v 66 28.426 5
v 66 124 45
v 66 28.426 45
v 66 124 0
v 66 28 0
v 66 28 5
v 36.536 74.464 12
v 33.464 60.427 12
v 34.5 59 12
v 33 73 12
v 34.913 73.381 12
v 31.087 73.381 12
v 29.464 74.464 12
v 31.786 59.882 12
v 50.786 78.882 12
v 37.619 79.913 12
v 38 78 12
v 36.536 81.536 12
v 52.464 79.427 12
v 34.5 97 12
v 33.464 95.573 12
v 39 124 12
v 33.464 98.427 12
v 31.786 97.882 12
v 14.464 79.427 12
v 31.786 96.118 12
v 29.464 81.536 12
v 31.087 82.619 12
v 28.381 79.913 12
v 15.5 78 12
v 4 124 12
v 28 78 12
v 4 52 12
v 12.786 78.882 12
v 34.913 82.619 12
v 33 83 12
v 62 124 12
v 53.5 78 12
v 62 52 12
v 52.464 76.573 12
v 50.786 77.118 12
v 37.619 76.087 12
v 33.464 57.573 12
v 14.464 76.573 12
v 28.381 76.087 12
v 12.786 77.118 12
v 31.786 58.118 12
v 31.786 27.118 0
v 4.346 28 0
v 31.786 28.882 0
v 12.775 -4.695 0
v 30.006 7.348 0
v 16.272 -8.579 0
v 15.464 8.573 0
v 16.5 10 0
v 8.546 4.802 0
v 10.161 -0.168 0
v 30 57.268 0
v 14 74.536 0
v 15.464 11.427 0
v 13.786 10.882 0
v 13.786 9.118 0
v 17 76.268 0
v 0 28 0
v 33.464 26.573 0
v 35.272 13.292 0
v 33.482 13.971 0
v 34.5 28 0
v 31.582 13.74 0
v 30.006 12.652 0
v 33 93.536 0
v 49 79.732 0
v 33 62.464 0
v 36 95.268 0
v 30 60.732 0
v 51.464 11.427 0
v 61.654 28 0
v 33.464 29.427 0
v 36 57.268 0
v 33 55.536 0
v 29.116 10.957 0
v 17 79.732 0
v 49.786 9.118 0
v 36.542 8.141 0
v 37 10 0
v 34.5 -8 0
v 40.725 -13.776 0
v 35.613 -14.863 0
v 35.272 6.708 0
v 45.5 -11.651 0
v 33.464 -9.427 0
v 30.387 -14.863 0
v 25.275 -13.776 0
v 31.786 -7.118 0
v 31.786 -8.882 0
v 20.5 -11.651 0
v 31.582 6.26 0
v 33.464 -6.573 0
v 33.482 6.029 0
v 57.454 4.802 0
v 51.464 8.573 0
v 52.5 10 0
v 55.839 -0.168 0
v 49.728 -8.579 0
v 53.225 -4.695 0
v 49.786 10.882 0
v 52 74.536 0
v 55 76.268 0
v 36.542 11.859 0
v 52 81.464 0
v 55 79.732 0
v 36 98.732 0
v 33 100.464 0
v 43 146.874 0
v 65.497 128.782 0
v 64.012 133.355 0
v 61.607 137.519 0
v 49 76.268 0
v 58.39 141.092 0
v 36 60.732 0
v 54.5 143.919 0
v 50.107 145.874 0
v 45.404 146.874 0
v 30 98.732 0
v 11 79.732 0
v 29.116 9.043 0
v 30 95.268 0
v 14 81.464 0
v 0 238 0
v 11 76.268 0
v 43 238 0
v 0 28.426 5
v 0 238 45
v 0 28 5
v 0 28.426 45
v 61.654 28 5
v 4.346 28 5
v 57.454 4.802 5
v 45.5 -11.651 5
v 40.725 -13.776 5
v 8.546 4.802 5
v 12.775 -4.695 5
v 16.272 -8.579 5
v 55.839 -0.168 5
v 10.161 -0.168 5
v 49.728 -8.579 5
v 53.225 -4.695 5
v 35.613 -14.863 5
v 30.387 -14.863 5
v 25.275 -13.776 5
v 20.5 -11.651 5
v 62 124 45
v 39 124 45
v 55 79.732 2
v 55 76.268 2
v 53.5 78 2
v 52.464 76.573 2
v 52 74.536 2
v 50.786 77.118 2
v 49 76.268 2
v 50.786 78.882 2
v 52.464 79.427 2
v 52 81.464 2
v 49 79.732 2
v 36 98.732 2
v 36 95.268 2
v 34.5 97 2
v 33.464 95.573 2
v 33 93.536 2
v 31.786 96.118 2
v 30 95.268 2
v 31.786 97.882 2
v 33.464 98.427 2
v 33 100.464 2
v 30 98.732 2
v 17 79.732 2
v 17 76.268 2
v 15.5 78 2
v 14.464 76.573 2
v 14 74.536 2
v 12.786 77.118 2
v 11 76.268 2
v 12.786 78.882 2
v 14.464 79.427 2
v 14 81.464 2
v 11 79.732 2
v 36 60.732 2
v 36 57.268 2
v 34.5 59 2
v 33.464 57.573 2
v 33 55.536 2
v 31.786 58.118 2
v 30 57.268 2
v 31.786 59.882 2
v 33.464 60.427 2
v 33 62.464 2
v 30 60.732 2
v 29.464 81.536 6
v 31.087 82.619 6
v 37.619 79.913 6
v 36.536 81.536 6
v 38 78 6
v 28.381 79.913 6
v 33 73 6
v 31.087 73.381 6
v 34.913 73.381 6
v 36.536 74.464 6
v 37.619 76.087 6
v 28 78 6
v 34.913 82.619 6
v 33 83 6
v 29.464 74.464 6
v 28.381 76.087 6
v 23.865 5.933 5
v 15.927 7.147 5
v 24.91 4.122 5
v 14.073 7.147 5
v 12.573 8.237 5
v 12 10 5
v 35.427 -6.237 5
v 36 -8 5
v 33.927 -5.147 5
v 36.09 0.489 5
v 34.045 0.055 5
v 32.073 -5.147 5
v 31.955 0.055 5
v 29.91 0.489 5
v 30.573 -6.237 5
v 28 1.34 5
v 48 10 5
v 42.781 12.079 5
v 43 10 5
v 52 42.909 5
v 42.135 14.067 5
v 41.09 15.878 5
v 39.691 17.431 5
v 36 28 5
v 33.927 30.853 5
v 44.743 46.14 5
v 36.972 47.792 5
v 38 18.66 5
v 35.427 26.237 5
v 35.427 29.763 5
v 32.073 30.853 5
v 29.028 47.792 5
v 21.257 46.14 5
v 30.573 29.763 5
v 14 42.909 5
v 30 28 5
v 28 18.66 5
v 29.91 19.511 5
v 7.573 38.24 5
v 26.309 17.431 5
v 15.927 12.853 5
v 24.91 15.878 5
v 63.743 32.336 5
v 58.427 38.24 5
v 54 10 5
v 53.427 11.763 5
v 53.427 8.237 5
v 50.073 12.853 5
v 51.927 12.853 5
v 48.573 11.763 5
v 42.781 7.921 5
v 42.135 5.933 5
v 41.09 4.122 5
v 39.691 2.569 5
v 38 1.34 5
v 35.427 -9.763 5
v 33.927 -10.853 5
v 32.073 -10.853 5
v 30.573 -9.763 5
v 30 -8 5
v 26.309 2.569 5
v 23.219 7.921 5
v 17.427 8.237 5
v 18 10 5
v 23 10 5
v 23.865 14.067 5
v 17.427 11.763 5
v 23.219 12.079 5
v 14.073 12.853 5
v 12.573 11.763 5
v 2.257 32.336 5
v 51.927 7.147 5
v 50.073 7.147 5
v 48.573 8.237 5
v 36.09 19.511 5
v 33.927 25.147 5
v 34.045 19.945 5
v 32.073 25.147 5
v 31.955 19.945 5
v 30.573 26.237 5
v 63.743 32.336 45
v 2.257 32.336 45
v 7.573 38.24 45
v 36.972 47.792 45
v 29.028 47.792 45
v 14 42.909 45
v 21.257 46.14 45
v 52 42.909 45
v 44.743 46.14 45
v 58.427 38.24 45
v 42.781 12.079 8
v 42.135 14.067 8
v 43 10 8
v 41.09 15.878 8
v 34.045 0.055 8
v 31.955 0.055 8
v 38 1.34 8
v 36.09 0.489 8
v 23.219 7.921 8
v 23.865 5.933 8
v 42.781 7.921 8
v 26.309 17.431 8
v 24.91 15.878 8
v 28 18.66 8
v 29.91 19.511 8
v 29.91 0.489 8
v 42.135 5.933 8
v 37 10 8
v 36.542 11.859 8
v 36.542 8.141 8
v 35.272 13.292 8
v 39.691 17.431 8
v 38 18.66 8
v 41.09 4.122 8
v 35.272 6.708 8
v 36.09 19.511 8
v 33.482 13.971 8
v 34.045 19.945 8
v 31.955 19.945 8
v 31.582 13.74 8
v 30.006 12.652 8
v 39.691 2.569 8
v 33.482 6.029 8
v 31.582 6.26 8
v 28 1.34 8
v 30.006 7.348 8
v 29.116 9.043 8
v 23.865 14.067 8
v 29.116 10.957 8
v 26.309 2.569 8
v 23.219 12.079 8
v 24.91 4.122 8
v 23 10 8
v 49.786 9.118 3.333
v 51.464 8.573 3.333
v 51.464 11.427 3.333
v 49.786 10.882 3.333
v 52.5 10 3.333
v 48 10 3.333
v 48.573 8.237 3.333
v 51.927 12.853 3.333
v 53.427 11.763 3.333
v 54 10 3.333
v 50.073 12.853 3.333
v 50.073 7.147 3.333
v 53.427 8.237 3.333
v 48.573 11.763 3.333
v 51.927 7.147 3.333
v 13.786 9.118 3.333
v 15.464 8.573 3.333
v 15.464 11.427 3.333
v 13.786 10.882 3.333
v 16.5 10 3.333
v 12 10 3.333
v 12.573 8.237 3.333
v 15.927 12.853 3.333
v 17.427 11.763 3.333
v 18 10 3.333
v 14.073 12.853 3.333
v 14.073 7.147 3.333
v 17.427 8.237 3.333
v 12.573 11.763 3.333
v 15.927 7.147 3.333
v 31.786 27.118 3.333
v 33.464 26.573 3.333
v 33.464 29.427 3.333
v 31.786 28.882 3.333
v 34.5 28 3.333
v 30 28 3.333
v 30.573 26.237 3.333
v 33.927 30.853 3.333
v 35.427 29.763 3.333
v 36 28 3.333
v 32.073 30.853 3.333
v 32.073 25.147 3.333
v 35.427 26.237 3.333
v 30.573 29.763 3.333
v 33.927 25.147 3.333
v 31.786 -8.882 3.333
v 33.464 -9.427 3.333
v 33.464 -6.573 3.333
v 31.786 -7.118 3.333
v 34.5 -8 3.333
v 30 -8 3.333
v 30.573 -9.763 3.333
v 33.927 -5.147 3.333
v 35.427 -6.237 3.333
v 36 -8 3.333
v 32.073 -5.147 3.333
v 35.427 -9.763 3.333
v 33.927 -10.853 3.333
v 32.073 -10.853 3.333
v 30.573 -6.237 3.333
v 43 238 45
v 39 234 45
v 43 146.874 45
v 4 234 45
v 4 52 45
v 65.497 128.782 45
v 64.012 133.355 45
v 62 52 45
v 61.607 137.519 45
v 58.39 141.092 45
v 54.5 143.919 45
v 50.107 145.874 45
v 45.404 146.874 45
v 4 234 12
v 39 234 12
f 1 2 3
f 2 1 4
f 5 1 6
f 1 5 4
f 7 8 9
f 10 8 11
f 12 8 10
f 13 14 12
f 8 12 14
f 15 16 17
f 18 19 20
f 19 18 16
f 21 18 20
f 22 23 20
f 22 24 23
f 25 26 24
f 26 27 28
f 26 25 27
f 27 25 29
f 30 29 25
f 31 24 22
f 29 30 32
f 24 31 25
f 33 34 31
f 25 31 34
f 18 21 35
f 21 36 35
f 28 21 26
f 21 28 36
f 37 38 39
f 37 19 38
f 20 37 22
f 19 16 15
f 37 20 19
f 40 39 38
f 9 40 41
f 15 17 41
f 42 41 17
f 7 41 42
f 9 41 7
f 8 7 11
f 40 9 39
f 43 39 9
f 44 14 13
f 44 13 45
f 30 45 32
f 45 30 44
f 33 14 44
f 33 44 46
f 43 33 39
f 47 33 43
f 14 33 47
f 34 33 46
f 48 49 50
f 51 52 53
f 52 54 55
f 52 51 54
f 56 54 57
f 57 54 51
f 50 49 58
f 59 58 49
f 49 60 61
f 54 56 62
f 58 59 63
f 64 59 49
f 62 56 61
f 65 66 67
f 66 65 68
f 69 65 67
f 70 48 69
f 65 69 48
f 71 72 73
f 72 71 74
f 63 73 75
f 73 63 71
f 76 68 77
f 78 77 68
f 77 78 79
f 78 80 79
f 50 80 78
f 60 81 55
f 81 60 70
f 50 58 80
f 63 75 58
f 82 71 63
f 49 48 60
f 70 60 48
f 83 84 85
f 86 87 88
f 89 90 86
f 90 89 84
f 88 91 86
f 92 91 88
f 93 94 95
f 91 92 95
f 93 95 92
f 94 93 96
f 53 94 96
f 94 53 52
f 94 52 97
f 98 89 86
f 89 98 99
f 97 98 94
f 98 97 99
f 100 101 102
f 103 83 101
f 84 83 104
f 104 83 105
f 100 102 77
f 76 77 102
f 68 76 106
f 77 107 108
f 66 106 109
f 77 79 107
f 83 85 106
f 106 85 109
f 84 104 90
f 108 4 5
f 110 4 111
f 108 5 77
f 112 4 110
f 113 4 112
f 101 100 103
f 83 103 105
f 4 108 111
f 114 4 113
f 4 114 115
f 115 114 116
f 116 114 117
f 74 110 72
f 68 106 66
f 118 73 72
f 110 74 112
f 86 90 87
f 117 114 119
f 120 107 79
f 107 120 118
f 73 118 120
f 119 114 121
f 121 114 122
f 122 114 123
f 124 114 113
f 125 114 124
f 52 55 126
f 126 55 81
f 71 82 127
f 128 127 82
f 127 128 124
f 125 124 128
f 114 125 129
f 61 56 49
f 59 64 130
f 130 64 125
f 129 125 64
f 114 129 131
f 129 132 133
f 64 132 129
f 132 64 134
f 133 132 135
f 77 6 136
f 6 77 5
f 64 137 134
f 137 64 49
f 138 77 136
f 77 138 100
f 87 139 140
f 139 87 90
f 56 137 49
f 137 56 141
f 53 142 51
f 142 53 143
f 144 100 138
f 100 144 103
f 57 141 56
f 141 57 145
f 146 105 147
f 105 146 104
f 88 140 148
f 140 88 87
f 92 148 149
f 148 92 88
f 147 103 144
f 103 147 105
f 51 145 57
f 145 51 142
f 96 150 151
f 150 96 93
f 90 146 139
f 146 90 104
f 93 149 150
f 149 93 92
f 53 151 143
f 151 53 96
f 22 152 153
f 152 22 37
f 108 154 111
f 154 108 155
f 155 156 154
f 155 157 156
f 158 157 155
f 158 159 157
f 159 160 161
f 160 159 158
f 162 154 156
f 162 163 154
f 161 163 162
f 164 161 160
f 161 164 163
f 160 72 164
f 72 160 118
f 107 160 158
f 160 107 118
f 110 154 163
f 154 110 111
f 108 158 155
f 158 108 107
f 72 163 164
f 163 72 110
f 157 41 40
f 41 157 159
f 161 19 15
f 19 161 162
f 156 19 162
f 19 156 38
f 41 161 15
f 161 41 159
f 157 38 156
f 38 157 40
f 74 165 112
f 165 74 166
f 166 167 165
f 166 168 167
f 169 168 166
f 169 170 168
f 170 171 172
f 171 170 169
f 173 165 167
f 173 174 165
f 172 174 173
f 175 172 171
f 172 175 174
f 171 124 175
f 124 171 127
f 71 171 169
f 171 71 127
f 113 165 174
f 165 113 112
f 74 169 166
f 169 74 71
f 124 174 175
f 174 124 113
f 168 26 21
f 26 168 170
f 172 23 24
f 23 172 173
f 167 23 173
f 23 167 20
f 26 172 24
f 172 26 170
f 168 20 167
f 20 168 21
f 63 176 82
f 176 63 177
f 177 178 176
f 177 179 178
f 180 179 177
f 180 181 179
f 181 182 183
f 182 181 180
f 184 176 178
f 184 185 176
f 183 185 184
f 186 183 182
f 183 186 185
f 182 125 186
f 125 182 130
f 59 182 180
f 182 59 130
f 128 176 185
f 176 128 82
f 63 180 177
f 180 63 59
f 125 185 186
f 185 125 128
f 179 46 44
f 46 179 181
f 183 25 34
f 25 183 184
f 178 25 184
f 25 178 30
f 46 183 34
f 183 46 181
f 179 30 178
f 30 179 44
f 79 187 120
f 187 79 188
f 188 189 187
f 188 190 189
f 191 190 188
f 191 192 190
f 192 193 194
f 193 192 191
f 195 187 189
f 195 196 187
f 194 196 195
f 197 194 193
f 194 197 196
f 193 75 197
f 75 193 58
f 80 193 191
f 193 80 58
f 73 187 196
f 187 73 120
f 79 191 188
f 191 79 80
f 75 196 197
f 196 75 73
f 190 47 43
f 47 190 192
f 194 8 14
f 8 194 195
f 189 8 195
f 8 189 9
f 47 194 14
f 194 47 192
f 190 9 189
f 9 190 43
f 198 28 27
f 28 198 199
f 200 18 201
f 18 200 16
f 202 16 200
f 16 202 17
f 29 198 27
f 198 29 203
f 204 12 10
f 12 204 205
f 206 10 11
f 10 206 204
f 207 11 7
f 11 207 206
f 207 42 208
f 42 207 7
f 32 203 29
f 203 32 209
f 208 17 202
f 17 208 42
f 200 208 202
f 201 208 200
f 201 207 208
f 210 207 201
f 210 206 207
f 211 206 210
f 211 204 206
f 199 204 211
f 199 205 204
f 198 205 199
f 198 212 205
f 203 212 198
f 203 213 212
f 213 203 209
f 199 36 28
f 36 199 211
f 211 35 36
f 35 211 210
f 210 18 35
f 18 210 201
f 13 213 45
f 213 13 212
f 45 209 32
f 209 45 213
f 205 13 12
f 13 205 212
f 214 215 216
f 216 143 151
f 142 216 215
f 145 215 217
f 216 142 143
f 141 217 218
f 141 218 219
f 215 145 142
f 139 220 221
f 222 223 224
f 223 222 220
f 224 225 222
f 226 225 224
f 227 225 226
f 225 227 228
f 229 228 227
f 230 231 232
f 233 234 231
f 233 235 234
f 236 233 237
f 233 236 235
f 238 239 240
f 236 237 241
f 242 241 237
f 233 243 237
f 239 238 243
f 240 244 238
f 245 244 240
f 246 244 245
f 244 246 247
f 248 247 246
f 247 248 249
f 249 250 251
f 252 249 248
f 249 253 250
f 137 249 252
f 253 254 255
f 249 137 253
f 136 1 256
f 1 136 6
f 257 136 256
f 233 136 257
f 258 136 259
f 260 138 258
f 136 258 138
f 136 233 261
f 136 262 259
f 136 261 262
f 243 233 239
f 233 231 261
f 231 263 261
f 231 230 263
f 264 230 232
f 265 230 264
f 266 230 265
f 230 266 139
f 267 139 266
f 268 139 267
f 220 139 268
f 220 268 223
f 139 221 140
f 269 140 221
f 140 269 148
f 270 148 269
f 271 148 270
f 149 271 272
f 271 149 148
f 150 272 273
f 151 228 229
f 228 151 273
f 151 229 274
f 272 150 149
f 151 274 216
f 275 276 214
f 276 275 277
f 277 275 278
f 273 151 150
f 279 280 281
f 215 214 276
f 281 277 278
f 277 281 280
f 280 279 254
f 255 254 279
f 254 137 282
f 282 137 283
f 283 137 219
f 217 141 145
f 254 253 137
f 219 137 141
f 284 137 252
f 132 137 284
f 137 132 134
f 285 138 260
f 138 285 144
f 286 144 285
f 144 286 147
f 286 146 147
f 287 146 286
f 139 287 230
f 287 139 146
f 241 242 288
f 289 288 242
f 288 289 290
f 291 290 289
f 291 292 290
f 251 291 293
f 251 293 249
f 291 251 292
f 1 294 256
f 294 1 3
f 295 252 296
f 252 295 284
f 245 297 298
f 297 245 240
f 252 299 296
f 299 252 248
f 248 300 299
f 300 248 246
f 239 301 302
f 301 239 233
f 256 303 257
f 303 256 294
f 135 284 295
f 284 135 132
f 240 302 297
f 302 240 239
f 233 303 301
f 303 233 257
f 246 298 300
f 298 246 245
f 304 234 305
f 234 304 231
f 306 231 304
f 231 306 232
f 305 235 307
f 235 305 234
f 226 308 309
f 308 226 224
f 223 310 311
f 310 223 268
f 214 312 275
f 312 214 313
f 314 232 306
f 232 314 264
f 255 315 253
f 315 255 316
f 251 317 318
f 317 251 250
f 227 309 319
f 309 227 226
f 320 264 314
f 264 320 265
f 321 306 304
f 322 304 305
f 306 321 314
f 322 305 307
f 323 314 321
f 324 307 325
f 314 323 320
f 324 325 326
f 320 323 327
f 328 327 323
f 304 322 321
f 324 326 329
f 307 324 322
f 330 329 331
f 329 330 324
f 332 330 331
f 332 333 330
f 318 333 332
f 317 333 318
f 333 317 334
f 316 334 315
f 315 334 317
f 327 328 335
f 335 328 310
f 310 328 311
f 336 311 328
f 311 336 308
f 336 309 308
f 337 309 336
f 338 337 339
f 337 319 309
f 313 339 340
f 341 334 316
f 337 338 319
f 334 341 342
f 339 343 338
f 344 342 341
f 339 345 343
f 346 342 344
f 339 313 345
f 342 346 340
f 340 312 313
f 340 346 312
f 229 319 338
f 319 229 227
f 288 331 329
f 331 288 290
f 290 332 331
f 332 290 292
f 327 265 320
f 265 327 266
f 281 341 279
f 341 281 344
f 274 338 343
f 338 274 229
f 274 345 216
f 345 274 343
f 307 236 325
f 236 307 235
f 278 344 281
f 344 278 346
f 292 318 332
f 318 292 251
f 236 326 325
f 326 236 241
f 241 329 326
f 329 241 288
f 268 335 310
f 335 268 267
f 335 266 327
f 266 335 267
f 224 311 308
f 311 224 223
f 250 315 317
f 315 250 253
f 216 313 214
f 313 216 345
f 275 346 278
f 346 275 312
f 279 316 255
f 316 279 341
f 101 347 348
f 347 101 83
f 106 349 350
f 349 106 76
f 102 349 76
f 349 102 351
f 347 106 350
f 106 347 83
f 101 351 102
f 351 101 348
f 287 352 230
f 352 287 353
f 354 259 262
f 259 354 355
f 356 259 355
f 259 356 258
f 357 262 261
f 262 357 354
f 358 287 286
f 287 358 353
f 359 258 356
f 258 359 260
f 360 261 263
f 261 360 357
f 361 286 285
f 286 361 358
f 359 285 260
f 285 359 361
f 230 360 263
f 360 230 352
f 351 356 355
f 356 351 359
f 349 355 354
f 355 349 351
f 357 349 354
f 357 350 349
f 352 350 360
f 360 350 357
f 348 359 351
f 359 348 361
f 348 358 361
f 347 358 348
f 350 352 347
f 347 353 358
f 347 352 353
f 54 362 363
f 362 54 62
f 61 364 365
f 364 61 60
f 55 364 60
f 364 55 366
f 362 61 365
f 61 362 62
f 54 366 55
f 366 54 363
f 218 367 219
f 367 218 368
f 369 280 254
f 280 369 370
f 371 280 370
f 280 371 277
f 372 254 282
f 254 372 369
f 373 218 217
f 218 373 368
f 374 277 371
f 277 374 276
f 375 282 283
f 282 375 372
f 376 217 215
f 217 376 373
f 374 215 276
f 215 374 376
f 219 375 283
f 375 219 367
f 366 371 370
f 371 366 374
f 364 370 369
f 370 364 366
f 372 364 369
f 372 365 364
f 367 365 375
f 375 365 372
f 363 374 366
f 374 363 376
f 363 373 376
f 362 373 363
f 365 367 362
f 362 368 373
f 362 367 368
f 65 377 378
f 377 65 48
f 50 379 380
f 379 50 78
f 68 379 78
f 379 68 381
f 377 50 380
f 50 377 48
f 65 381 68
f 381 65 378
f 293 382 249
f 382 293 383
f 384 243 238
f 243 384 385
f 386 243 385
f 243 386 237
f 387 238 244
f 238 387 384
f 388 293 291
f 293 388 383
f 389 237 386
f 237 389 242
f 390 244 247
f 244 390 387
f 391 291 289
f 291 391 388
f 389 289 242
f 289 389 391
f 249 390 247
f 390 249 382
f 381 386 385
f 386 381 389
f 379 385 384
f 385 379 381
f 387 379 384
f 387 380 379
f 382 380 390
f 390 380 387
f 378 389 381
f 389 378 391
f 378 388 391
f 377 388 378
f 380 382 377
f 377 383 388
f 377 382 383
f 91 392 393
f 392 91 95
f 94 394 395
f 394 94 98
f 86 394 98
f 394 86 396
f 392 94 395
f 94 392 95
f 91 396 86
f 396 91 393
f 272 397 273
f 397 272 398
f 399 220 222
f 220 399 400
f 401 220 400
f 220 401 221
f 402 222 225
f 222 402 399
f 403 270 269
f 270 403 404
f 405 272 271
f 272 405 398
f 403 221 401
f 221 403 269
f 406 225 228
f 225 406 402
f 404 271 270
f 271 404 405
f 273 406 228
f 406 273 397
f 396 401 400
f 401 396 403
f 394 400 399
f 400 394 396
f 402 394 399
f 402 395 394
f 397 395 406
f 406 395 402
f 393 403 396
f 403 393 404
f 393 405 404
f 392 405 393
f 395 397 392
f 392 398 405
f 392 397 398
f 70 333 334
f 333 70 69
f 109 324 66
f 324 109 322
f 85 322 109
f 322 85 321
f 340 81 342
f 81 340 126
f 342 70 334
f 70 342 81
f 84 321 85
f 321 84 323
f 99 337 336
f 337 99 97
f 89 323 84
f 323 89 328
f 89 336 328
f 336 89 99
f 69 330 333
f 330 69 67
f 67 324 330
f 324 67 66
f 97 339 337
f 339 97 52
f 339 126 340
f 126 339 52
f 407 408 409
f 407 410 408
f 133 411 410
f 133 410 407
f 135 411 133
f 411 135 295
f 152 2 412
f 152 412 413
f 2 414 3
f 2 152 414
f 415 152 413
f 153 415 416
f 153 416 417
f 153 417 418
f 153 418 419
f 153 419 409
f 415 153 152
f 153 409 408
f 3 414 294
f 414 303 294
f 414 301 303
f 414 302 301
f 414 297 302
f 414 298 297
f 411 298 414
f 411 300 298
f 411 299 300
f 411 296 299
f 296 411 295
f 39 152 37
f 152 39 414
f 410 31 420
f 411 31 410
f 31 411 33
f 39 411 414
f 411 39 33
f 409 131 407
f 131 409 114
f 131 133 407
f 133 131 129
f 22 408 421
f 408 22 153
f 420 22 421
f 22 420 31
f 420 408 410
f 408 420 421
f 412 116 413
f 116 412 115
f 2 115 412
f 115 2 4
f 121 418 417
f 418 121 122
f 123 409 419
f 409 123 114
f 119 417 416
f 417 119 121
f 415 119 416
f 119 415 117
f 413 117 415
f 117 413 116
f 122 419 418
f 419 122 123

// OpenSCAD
// file: hexagon.scad
module hexagon(d,h)
{
	angle = 360/6;
	cote = d * cot(angle);

	union()
	{
		rotate([0,0,0])
			cube([d,cote,h],center=true);
		rotate([0,0,angle])
			cube([d,cote,h],center=true);
		rotate([0,0,2*angle])
			cube([d,cote,h],center=true);
	}
}

function cot(x)=1/tan(x);
// file: constants.scad
show_motor_box = 1;
show_motor_base = 1;
show_battery_box = 1;

show_shaft = 0;
show_extras = 0;

battery_l = 110;
battery_w = 35;
battery_h = 30;

motor_dia = 28;
motor_len = 41;
motor_shaft_len = 10;
motor_shaft_dia = 3;
motor_offset = 40;

motor_mount_centerhole_dia = 10;
motor_mount_holes_dist = 38; //(r = 19)
motor_mount_holes_dia = 3;
motor_mount_thick = 3;

wheel_dia = 56;
wheel_height = 37;
wheel_guard = 3;
wheel_offset = -7;
wheel_shaft_dia = 8;

gear_offset = 2;
gear_thick = 12.7;
wheel_gear_dia = 45;
motor_gear_dia = wheel_gear_dia/2;

wheel_shaft_len = wheel_height + wheel_guard + gear_thick + 10;

base_width = wheel_dia + 10;
base_height = wheel_dia + motor_dia + 40;
base_thick = 12;
wall_thick = 4;

shaft_offset = 10;

wheel_center = [base_width/2, shaft_offset, base_thick + wheel_offset + wheel_guard];
shaft_center = [base_width/2, shaft_offset, base_thick + wheel_offset];
motor_center = [base_width/2, shaft_offset + motor_offset + wheel_dia/2, base_thick];
// main file
include <constants.scad>
include <hexagon.scad>

hide_motor_box = 0;
wheel_hub_nut = 0;

module battery_box() {
	translate([0, base_height, 0])
	difference() {
		cube([
			battery_w + wall_thick*2,
			battery_l + wall_thick,
			base_thick + wheel_height + wheel_offset + wheel_guard
		]);

		translate([wall_thick, 0, base_thick])
			cube([
				battery_w,
				battery_l,
				wheel_height + wheel_offset + wheel_guard				
			]);
	}

	translate ([battery_w + wall_thick*2, base_height, 0]) {
		intersection() {
			cylinder(
				h = 	base_thick + wheel_height + wheel_offset + wheel_guard,
				r = (base_width - battery_w - wall_thick*2)
			);
			cube([
				base_width - battery_w - wall_thick*2,
				base_width - battery_w - wall_thick*2,
				base_thick + wheel_height + wheel_offset + wheel_guard
			]);
		}
	}
}

module base() {
	difference() {

		translate([0, -1 * wheel_dia/2, 0])
		cube([
			base_width,
			base_height + wheel_dia/2,
			base_thick]);

		difference() {
			translate([0, -1 * wheel_dia/2, 0])
			cube([
				base_width,
				wheel_dia/2 + shaft_offset + 18,
				base_thick
			]);
			hull() {
			translate([base_width/2, shaft_offset, 0])
				cylinder(h=base_thick, d=wheel_dia - wheel_guard * 2);
			translate([0, wheel_dia/2 + shaft_offset + 10 + wall_thick, 0])
				cube([
					base_width,
					2,
					base_thick
				]);
			}
		}
	}
}

module motor_mount_holes() {
	translate (motor_center) translate([0,0,-1 * base_thick]) {
		//Center hole
		translate([0,0,base_thick/2])
		cylinder(h=base_thick, d=motor_mount_centerhole_dia);

		translate([motor_mount_holes_dist/2,0,0]) {
			cylinder(h=base_thick, d=motor_mount_holes_dia);
			hexagon(h=base_thick/3, d=motor_mount_holes_dia * 2);

		}
		translate([0,motor_mount_holes_dist/2,0]) {
			cylinder(h=base_thick, d=motor_mount_holes_dia);
			hexagon(h=base_thick/3, d=motor_mount_holes_dia * 2);
		}
		translate([-1 * motor_mount_holes_dist/2,0,0]) {
			cylinder(h=base_thick, d=motor_mount_holes_dia);
			hexagon(h=base_thick/3, d=motor_mount_holes_dia * 2);
		}
		translate([0,-1 * motor_mount_holes_dist/2,0]) {
			cylinder(h=base_thick, d=motor_mount_holes_dia);
			hexagon(h=base_thick/3, d=motor_mount_holes_dia * 2);
		}
	}

}

module base_mounting_holes() {
	
	mount_hole_radius = base_width/2 - 15;
	mount_hole_base_thick = base_thick + wheel_offset;
	
	translate([base_width/2, shaft_offset, 0]) {
		translate([mount_hole_radius, 0, 0]) {
			cylinder(h=base_thick, d=3);
			translate([0,0,2*mount_hole_base_thick/3])
			cylinder(h=base_thick/3, d=motor_mount_holes_dia * 2);
		}
		translate([-1 * mount_hole_radius, 0, 0]){
			cylinder(h=base_thick, d=3);
			translate([0,0,2*mount_hole_base_thick/3])
			cylinder(h=base_thick/3, d=motor_mount_holes_dia * 2);
		}
		translate([0, mount_hole_radius, 0]){
			cylinder(h=base_thick, d=3);
			translate([0,0,2*mount_hole_base_thick/3])
			cylinder(h=base_thick/3, d=motor_mount_holes_dia * 2);
		}
		translate([0, -1 * mount_hole_radius, 0]){
			cylinder(h=base_thick, d=3);
			translate([0,0,2*mount_hole_base_thick/3])
			cylinder(h=base_thick/3, d=motor_mount_holes_dia * 2);
		}
	}
}

module motor_box() {
	translate ([0, 0, base_thick]) {
		difference () {
			cube([
				base_width,
				base_height,
				wheel_height + wheel_guard + wheel_offset]);

			translate([base_width/2, shaft_offset, 0]) {
				cylinder( h = wheel_height + wheel_guard, d = wheel_dia + 20);
			}

			translate([wall_thick, wheel_dia/2 + shaft_offset + 10 + wall_thick, 0])
			cube([
				base_width - wall_thick * 2,
				base_height,
				wheel_height + wheel_guard
			]);
		}
	}
}

module wheel_shaft() {
	translate (shaft_center) 
		cylinder(h = wheel_shaft_len, r = wheel_shaft_dia/2);
}

module wheel_shaft_hole() {
	translate([base_width/2, shaft_offset, 0])
		cylinder(h=base_thick, r=wheel_shaft_dia/2);
}

module box() {
	echo("Length of the device: ", base_height + base_thick*2 + battery_l );
	echo("Height of the motor box:", wheel_height + wheel_guard + wheel_offset + base_thick);

	difference () {
		union() {
		difference () {
			base();

			// Motor mounting holes
			motor_mount_holes();


			// Space around wheel
			translate([base_width/2, shaft_offset, base_thick + wheel_offset]) {
				cylinder( h = wheel_height + wheel_guard, d = wheel_dia + 20);
			}
		}

		// Wheel offset
		translate([
			base_width/2,
			shaft_offset,
			0])
			cylinder(h=base_thick + wheel_offset + wheel_guard, r=shaft_offset);
		}


		// Wheel center hole
		wheel_shaft_hole();

		// Wheel hub nut
		if (wheel_hub_nut)
		translate([base_width/2, shaft_offset, 0]) hexagon(d=wheel_shaft_dia*2, h=5);

		//Base mounting holes
		base_mounting_holes();
	}

	if (! hide_motor_box) {
		motor_box();
	}

	if (show_shaft) {
		//Wheel position
		wheel_shaft();
	}

	if (show_battery_box) {
		battery_box();
	}
}

box();
